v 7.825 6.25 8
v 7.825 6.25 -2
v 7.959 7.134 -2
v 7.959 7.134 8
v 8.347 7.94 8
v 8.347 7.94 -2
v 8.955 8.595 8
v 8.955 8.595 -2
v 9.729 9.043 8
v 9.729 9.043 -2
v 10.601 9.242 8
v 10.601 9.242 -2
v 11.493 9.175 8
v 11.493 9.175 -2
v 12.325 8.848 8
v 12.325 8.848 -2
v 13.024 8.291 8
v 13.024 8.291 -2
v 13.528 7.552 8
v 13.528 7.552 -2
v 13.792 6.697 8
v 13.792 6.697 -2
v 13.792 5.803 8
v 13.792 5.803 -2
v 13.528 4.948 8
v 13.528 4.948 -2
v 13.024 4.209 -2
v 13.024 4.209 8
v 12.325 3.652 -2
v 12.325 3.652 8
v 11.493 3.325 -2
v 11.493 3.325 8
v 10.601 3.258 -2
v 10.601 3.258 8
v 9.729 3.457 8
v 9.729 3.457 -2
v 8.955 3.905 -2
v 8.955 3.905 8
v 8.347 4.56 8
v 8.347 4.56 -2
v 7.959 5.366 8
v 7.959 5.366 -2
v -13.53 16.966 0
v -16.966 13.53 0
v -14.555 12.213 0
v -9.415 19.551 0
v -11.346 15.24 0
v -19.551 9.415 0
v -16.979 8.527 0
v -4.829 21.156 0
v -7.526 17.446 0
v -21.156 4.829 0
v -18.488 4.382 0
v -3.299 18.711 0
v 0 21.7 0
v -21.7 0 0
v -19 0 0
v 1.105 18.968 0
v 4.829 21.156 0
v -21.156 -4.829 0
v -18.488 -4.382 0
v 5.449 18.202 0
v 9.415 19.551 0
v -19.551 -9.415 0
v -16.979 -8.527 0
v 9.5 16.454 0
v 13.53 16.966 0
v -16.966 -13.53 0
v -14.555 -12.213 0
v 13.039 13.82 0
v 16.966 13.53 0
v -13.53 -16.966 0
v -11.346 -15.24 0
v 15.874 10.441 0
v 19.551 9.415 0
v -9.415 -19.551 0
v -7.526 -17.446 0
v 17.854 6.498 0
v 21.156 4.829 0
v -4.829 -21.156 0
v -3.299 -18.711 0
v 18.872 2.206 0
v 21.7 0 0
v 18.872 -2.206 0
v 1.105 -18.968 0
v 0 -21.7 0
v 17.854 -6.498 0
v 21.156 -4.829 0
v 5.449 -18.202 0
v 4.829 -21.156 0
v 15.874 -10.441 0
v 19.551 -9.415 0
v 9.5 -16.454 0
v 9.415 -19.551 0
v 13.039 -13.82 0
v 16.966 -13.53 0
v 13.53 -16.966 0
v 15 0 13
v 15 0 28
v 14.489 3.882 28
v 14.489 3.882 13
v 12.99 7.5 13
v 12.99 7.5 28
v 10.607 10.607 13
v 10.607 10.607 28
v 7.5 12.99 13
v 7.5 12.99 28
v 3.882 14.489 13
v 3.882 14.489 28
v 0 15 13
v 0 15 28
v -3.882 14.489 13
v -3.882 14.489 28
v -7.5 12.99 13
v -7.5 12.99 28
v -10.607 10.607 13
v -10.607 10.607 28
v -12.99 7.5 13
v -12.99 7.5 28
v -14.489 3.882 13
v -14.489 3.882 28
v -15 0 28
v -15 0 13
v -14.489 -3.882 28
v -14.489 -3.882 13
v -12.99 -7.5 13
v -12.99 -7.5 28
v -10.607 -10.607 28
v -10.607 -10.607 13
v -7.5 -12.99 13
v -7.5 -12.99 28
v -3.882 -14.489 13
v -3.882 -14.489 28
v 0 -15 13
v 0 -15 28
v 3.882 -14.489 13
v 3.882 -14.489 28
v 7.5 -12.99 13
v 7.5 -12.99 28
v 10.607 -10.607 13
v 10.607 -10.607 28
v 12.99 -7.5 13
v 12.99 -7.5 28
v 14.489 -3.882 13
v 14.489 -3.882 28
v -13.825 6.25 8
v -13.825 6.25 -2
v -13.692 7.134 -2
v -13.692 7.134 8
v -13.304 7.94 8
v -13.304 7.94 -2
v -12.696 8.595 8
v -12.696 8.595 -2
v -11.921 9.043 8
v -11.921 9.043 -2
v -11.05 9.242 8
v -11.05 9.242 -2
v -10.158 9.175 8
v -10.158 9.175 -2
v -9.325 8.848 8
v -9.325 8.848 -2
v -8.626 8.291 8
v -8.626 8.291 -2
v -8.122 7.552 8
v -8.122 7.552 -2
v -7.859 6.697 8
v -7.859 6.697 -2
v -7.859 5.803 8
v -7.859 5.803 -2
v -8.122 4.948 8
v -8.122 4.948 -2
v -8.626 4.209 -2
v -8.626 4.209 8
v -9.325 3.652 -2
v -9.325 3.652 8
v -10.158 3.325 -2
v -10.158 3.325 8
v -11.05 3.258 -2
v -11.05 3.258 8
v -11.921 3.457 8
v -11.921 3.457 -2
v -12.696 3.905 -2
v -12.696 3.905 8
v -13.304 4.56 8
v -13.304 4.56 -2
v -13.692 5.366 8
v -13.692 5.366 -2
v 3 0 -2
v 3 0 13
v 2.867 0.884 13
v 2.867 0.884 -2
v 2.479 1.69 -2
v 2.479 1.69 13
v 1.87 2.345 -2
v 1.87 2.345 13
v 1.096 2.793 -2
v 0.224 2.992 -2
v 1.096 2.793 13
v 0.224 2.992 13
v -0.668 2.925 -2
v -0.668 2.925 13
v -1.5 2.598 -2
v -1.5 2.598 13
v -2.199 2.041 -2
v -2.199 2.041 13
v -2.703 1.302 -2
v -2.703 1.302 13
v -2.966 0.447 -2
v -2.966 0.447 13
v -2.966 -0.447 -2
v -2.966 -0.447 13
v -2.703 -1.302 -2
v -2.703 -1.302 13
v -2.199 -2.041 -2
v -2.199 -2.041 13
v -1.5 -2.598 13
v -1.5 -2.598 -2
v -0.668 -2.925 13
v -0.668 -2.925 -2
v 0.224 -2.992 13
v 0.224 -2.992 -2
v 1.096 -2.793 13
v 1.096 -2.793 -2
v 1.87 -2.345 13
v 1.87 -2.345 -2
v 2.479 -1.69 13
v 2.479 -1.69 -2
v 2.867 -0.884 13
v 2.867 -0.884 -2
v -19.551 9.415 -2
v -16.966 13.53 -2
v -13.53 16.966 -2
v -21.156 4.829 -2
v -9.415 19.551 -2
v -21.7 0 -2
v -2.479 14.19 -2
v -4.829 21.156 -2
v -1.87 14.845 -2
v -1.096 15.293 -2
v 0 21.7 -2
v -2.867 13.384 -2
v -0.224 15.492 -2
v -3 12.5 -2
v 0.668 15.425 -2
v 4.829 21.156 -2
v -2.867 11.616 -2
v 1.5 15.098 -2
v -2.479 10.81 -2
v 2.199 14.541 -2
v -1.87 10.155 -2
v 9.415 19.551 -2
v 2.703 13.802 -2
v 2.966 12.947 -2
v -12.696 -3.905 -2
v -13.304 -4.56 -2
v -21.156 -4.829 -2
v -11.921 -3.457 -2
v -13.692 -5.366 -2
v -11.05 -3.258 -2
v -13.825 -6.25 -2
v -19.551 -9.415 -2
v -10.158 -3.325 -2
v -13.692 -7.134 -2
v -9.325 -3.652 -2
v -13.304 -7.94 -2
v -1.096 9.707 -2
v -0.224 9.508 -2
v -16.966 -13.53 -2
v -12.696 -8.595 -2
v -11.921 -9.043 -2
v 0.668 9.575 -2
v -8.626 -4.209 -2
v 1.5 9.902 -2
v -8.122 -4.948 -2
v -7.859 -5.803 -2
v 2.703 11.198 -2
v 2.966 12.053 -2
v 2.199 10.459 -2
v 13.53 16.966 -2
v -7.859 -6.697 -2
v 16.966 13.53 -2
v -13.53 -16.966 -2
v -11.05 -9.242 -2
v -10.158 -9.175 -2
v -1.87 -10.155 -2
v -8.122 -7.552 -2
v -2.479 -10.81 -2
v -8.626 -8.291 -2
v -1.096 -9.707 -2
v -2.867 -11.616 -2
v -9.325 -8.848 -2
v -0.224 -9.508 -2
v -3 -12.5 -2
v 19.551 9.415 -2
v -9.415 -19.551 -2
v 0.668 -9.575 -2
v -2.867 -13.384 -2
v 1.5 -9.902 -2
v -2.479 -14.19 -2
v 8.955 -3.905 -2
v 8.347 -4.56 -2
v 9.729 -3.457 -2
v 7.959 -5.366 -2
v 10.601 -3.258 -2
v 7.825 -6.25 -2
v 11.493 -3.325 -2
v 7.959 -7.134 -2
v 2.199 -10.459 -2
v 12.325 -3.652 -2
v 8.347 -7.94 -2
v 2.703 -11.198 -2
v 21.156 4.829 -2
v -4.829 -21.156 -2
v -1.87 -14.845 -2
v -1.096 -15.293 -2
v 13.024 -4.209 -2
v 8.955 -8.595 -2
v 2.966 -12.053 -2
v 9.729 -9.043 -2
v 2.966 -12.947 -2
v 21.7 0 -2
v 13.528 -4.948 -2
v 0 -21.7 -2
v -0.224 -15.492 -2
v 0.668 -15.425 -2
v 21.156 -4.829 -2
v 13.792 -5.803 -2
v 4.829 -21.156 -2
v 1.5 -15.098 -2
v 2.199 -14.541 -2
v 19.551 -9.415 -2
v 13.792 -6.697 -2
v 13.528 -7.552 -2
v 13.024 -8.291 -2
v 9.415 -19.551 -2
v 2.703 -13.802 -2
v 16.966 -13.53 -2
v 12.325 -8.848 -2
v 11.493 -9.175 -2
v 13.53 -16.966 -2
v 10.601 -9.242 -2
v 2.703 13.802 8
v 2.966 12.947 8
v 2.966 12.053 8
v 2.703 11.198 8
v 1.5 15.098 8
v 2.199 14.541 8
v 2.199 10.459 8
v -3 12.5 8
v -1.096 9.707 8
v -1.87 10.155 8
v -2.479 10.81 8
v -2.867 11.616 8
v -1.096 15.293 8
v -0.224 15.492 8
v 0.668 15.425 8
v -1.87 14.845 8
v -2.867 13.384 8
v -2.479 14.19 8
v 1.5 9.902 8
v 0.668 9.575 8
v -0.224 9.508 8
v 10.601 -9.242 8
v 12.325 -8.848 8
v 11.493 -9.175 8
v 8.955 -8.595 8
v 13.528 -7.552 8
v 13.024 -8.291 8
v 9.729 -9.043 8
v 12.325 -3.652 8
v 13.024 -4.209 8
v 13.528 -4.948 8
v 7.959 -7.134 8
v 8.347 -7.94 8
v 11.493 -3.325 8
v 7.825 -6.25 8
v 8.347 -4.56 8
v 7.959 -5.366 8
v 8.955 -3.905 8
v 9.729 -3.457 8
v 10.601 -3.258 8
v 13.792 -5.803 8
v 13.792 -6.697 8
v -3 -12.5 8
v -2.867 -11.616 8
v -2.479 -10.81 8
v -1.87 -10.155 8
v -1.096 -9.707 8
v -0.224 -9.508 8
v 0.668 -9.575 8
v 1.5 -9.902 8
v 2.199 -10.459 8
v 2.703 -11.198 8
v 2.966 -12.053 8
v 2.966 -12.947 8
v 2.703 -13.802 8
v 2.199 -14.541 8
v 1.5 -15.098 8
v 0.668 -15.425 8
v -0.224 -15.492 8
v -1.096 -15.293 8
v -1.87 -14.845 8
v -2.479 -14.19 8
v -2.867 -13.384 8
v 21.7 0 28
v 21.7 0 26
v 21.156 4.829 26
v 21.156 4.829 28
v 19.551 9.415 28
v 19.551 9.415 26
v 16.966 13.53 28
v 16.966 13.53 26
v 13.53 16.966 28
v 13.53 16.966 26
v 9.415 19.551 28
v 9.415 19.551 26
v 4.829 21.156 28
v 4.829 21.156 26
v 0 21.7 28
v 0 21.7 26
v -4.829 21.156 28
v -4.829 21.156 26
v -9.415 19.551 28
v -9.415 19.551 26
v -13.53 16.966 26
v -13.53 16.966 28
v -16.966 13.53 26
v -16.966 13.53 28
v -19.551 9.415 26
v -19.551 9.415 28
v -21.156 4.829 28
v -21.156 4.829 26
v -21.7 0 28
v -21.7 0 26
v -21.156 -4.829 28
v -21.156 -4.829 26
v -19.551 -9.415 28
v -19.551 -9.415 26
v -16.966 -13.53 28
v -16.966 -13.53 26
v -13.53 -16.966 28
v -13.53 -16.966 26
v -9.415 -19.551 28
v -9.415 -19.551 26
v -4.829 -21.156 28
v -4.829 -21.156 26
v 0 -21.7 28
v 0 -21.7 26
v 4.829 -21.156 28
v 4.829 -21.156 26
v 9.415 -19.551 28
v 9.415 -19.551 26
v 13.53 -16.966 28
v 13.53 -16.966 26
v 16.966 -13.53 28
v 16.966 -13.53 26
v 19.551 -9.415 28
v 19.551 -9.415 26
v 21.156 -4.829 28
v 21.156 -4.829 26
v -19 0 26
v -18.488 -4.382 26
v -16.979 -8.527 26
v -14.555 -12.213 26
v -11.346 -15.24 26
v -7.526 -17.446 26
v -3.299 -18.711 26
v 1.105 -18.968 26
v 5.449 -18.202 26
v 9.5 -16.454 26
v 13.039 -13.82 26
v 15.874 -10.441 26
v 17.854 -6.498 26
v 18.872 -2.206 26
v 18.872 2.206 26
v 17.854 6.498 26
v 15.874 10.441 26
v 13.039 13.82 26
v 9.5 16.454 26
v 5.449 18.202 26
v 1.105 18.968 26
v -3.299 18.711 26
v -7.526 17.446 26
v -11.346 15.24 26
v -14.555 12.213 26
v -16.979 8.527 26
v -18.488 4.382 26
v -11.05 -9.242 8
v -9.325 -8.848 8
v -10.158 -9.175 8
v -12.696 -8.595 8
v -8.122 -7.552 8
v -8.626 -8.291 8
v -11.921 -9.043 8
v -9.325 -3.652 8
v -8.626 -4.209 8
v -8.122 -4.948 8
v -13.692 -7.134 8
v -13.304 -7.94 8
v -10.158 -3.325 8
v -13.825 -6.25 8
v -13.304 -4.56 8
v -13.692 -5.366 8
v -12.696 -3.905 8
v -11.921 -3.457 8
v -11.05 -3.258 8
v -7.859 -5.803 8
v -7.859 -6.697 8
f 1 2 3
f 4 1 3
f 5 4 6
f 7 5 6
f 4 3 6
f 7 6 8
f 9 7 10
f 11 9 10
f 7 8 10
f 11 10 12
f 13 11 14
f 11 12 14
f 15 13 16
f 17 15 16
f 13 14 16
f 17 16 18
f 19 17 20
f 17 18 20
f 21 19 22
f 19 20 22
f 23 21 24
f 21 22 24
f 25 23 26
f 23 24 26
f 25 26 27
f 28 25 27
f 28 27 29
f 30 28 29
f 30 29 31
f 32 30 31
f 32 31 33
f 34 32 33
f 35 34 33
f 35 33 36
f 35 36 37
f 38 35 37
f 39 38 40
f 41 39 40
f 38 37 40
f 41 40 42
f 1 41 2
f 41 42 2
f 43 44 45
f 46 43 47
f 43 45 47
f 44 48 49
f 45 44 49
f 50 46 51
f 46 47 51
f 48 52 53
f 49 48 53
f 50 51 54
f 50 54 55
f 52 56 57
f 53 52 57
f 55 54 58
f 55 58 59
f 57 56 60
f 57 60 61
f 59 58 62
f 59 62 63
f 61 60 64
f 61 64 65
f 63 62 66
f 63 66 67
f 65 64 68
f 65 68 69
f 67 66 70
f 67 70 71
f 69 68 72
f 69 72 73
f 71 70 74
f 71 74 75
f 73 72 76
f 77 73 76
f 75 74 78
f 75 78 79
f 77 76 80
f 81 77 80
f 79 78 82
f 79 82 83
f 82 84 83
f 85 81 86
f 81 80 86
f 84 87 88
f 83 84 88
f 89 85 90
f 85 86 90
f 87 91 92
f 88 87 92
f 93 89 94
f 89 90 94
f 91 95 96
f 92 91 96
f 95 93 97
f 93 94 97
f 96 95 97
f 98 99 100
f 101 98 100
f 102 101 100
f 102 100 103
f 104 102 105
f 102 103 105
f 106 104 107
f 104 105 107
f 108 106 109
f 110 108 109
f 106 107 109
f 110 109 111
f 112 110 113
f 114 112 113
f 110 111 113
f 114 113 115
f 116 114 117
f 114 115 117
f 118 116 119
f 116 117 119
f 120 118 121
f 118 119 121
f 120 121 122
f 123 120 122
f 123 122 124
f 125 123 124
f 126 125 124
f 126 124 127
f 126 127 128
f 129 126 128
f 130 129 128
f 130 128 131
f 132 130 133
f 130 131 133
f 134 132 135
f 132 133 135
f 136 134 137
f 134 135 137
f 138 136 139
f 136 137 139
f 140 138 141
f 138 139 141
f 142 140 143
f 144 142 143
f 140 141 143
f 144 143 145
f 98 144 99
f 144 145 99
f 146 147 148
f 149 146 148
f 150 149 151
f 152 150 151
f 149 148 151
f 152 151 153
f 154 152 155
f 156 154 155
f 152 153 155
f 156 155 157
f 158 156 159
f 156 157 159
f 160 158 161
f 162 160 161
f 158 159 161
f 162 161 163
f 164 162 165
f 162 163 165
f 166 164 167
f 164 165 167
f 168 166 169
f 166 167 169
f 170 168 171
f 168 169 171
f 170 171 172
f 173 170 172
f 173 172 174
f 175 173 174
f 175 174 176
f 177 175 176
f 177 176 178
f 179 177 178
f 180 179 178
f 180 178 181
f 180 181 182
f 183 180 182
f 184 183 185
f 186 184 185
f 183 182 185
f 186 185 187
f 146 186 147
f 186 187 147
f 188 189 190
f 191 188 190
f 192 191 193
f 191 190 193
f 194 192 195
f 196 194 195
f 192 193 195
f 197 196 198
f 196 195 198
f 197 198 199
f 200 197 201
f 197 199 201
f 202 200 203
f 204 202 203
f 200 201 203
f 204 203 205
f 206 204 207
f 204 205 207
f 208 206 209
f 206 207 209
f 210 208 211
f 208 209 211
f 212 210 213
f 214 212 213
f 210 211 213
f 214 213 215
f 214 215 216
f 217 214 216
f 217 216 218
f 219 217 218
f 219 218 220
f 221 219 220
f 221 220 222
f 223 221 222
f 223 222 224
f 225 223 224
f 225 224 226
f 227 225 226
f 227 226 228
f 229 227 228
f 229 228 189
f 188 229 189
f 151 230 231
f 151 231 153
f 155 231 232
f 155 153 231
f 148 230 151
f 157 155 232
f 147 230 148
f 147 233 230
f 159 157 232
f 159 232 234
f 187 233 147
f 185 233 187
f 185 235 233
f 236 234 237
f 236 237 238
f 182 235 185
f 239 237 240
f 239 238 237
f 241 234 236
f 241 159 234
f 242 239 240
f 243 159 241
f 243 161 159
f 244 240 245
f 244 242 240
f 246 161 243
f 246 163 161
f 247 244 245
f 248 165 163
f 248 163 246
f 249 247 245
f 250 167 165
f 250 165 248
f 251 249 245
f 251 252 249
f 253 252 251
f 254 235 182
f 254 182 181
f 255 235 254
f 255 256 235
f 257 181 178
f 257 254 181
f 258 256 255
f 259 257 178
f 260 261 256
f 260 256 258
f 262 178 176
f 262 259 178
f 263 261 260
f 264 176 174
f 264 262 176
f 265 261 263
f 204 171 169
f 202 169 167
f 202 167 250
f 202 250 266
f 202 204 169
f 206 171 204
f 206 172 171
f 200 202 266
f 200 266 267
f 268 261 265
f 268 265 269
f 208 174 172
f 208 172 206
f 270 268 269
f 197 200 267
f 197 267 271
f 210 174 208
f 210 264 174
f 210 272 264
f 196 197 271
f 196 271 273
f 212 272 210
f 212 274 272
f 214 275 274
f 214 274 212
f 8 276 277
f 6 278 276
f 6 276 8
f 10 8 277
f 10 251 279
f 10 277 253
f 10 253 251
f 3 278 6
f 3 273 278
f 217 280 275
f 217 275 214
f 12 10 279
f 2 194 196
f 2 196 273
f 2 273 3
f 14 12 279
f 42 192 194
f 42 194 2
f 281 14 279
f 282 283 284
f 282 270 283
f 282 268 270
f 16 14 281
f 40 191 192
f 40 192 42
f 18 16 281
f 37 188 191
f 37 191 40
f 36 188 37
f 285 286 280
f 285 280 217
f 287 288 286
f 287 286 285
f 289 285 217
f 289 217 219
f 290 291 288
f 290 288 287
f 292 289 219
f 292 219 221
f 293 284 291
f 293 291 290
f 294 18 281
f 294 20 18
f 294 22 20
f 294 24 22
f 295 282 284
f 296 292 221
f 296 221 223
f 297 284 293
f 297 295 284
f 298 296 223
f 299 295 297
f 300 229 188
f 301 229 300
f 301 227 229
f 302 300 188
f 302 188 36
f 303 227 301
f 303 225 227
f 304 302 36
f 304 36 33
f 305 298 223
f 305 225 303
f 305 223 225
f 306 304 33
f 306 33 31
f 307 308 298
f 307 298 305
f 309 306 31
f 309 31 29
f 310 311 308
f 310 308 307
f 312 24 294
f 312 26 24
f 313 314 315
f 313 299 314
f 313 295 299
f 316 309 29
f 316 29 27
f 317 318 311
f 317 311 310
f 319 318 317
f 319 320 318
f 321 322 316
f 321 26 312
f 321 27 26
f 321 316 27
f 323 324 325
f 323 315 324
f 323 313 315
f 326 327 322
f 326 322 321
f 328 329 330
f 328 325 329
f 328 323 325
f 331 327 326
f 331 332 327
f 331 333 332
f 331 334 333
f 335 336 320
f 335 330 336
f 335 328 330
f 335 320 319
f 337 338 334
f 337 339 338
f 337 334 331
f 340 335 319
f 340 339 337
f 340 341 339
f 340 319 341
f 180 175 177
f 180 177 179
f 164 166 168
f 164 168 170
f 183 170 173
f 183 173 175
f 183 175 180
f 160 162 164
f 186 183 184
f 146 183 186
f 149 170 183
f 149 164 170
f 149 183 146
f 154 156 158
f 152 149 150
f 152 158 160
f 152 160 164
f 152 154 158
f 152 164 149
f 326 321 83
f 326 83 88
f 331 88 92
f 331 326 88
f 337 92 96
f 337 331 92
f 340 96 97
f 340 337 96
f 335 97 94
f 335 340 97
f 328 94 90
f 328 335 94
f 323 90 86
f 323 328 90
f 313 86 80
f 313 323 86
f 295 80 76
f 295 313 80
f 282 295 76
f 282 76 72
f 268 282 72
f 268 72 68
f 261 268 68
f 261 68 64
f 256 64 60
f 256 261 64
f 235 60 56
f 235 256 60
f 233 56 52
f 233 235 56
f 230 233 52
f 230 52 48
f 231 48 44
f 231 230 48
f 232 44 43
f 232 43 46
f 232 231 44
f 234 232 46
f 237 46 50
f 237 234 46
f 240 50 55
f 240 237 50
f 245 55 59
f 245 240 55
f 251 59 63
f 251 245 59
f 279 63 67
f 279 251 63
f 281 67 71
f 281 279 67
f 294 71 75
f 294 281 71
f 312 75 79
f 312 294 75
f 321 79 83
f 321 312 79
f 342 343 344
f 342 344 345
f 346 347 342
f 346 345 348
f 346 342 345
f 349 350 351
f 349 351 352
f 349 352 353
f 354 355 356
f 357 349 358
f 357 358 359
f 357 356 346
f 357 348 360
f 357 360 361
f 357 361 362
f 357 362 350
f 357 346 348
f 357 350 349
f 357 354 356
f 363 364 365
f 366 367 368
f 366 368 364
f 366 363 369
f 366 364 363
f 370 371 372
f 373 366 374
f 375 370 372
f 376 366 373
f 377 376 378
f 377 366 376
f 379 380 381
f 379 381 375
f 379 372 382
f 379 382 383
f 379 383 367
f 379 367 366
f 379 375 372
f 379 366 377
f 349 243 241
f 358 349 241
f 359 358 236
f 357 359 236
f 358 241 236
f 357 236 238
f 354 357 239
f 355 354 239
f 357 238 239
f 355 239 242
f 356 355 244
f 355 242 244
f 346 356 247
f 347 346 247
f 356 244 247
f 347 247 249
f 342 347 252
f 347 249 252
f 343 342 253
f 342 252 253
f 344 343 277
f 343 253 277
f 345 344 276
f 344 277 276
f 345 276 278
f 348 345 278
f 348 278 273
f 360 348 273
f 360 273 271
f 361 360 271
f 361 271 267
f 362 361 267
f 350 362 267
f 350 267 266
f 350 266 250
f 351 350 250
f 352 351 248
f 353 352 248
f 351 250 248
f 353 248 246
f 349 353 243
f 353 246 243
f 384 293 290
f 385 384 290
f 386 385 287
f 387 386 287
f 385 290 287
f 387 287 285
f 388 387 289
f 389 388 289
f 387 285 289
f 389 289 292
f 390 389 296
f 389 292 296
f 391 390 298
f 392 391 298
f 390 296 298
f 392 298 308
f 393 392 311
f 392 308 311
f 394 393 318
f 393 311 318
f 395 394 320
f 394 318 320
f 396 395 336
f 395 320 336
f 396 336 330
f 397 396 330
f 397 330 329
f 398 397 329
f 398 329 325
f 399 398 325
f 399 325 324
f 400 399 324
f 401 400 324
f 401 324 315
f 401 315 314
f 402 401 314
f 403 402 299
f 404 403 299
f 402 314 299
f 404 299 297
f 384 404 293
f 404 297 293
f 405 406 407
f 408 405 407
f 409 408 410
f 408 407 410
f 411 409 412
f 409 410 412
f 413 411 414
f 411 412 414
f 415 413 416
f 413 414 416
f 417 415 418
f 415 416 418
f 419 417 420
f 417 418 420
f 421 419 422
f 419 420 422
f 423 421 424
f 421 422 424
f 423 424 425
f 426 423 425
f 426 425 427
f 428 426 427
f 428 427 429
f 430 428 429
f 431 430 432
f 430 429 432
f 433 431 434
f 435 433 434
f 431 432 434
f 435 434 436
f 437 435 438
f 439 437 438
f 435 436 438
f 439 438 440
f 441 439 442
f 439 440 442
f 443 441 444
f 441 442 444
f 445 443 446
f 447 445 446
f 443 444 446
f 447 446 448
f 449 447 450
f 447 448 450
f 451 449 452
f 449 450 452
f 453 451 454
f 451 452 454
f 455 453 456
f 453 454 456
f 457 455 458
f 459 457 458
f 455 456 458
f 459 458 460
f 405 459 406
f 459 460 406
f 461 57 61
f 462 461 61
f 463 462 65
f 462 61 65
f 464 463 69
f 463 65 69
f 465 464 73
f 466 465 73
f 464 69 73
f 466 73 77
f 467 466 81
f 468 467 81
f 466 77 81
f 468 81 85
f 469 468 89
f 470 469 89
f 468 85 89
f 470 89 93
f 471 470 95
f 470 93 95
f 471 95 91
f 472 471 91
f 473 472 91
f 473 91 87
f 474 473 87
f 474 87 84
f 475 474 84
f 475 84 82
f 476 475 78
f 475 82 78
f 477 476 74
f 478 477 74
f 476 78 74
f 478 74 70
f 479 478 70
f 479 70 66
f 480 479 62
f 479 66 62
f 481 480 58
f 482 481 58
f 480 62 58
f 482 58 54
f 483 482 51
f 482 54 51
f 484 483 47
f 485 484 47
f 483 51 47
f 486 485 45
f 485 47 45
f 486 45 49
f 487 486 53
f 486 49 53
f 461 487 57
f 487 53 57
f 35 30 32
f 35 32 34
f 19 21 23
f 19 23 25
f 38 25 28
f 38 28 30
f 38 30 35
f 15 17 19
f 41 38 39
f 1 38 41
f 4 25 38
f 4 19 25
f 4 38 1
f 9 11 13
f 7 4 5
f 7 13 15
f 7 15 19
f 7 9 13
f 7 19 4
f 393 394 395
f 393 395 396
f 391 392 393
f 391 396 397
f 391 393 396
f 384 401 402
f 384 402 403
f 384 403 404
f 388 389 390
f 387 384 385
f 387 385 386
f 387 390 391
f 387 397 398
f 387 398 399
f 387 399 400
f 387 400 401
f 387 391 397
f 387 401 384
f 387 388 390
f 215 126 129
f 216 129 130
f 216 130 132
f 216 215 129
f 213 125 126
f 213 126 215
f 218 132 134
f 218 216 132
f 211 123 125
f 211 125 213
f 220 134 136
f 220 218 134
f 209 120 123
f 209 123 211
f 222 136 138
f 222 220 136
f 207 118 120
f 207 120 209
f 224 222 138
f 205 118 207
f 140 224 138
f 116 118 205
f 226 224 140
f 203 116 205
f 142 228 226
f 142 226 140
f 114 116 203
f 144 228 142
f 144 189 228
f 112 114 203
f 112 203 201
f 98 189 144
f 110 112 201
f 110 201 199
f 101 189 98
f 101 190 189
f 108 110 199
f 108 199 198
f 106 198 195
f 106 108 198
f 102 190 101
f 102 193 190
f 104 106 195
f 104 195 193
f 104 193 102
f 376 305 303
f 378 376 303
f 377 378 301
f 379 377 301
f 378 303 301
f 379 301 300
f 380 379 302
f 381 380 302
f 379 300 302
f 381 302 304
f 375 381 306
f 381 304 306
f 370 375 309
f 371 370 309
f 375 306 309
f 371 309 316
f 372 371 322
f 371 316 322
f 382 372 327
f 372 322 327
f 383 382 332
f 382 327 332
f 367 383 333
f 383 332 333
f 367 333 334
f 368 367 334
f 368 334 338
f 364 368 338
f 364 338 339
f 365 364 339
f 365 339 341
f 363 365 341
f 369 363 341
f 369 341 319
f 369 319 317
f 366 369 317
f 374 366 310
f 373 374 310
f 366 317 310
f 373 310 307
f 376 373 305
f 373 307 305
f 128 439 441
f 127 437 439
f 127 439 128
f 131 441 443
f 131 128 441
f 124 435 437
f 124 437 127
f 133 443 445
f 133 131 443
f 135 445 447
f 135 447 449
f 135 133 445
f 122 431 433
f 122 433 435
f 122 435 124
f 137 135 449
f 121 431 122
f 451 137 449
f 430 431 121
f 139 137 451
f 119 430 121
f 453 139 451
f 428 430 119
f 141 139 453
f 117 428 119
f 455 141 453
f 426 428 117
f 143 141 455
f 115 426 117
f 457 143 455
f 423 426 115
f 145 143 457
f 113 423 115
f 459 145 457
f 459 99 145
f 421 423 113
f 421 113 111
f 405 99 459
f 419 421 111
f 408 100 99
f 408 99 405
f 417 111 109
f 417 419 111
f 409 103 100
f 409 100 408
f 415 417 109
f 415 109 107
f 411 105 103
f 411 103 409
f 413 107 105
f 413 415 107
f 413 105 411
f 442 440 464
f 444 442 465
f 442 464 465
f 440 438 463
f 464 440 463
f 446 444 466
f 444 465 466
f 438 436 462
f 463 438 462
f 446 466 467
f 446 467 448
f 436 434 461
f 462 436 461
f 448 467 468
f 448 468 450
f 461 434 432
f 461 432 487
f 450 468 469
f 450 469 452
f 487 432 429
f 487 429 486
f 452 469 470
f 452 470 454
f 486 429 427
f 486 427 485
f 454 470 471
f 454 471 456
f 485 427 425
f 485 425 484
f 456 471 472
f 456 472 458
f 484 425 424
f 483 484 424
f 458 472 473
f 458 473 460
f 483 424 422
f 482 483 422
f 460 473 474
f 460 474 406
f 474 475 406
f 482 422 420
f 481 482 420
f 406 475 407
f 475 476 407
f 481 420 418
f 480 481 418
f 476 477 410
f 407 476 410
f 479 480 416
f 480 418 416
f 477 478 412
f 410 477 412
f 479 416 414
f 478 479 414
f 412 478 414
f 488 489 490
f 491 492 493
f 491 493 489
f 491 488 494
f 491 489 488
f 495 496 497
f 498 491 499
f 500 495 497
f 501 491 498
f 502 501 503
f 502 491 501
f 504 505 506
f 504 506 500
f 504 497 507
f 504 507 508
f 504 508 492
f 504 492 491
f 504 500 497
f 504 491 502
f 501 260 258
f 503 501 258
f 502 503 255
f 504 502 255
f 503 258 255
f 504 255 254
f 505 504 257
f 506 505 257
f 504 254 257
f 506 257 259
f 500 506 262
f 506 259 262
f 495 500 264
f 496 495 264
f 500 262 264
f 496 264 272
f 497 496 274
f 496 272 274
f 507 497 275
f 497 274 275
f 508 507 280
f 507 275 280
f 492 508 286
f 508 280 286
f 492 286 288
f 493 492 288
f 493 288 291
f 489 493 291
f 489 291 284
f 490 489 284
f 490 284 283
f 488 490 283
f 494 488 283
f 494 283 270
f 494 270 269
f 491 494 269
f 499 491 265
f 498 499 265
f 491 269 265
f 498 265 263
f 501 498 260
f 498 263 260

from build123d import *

# Parameters (mm, degrees)
CROQUIS2_R              = 19
SALIENTE_EXTRUIR1_DEPTH = 26
CROQUIS3_R              = 21.7
SALIENTE_EXTRUIR2_DEPTH = 2
SALIENTE_EXTRUIR3_START = 2
CROQUIS4_R              = 21.7
SALIENTE_EXTRUIR3_DEPTH = 2
CROQUIS5_R              = 15
CORTAR_EXTRUIR1_DEPTH   = 15
CROQUIS6_R              = 3
CORTAR_EXTRUIR2_DEPTH   = 35.158161543
CROQUIS7_R              = 3
CORTAR_EXTRUIR3_DEPTH   = 10


with BuildPart() as part:
    # Croquis2 → Saliente-Extruir1 (new body)
    with BuildSketch(Plane.XY):
        with Locations(Location((0, 0, 0), (0, 0, 180))):
            Circle(CROQUIS2_R)
    extrude(amount=SALIENTE_EXTRUIR1_DEPTH)

    # Croquis3 → Saliente-Extruir2 (add)
    with BuildSketch(Plane.XY.offset(26)):
        Circle(CROQUIS3_R)
    extrude(amount=SALIENTE_EXTRUIR2_DEPTH)

    # Croquis4 → Saliente-Extruir3 (add)
    with BuildSketch(Plane(origin=(0, 0, 0), x_dir=(-1, 0, 0), z_dir=(0, 0, -1)).offset(SALIENTE_EXTRUIR3_START)):
        with Locations(Location((0, 0, 0), (0, 0, 180))):
            Circle(CROQUIS4_R)
    extrude(amount=-SALIENTE_EXTRUIR3_DEPTH)

    # Croquis5 → Cortar-Extruir1 (cut)
    with BuildSketch(Plane.XY.offset(28)):
        Circle(CROQUIS5_R)
    extrude(amount=-CORTAR_EXTRUIR1_DEPTH, mode=Mode.SUBTRACT)

    # Croquis6 → Cortar-Extruir2 (cut, through all)
    with BuildSketch(Plane.XY.offset(13)):
        Circle(CROQUIS6_R)
    extrude(amount=-CORTAR_EXTRUIR2_DEPTH, mode=Mode.SUBTRACT)

    # Croquis7 → Cortar-Extruir3 (cut)
    with BuildSketch(Plane(origin=(0, 0, -2), x_dir=(-1, 0, 0), z_dir=(0, 0, -1))):
        with Locations((0, 12.5)):
            Circle(CROQUIS7_R)
        with Locations((10.825317547, 6.25)):
            Circle(CROQUIS7_R)
        with Locations((10.825317547, -6.25)):
            Circle(CROQUIS7_R)
        with Locations((0, -12.5)):
            Circle(CROQUIS7_R)
        with Locations((-10.825317547, -6.25)):
            Circle(CROQUIS7_R)
        with Locations((-10.825317547, 6.25)):
            Circle(CROQUIS7_R)
    extrude(amount=-CORTAR_EXTRUIR3_DEPTH, mode=Mode.SUBTRACT)


solid = part.part
